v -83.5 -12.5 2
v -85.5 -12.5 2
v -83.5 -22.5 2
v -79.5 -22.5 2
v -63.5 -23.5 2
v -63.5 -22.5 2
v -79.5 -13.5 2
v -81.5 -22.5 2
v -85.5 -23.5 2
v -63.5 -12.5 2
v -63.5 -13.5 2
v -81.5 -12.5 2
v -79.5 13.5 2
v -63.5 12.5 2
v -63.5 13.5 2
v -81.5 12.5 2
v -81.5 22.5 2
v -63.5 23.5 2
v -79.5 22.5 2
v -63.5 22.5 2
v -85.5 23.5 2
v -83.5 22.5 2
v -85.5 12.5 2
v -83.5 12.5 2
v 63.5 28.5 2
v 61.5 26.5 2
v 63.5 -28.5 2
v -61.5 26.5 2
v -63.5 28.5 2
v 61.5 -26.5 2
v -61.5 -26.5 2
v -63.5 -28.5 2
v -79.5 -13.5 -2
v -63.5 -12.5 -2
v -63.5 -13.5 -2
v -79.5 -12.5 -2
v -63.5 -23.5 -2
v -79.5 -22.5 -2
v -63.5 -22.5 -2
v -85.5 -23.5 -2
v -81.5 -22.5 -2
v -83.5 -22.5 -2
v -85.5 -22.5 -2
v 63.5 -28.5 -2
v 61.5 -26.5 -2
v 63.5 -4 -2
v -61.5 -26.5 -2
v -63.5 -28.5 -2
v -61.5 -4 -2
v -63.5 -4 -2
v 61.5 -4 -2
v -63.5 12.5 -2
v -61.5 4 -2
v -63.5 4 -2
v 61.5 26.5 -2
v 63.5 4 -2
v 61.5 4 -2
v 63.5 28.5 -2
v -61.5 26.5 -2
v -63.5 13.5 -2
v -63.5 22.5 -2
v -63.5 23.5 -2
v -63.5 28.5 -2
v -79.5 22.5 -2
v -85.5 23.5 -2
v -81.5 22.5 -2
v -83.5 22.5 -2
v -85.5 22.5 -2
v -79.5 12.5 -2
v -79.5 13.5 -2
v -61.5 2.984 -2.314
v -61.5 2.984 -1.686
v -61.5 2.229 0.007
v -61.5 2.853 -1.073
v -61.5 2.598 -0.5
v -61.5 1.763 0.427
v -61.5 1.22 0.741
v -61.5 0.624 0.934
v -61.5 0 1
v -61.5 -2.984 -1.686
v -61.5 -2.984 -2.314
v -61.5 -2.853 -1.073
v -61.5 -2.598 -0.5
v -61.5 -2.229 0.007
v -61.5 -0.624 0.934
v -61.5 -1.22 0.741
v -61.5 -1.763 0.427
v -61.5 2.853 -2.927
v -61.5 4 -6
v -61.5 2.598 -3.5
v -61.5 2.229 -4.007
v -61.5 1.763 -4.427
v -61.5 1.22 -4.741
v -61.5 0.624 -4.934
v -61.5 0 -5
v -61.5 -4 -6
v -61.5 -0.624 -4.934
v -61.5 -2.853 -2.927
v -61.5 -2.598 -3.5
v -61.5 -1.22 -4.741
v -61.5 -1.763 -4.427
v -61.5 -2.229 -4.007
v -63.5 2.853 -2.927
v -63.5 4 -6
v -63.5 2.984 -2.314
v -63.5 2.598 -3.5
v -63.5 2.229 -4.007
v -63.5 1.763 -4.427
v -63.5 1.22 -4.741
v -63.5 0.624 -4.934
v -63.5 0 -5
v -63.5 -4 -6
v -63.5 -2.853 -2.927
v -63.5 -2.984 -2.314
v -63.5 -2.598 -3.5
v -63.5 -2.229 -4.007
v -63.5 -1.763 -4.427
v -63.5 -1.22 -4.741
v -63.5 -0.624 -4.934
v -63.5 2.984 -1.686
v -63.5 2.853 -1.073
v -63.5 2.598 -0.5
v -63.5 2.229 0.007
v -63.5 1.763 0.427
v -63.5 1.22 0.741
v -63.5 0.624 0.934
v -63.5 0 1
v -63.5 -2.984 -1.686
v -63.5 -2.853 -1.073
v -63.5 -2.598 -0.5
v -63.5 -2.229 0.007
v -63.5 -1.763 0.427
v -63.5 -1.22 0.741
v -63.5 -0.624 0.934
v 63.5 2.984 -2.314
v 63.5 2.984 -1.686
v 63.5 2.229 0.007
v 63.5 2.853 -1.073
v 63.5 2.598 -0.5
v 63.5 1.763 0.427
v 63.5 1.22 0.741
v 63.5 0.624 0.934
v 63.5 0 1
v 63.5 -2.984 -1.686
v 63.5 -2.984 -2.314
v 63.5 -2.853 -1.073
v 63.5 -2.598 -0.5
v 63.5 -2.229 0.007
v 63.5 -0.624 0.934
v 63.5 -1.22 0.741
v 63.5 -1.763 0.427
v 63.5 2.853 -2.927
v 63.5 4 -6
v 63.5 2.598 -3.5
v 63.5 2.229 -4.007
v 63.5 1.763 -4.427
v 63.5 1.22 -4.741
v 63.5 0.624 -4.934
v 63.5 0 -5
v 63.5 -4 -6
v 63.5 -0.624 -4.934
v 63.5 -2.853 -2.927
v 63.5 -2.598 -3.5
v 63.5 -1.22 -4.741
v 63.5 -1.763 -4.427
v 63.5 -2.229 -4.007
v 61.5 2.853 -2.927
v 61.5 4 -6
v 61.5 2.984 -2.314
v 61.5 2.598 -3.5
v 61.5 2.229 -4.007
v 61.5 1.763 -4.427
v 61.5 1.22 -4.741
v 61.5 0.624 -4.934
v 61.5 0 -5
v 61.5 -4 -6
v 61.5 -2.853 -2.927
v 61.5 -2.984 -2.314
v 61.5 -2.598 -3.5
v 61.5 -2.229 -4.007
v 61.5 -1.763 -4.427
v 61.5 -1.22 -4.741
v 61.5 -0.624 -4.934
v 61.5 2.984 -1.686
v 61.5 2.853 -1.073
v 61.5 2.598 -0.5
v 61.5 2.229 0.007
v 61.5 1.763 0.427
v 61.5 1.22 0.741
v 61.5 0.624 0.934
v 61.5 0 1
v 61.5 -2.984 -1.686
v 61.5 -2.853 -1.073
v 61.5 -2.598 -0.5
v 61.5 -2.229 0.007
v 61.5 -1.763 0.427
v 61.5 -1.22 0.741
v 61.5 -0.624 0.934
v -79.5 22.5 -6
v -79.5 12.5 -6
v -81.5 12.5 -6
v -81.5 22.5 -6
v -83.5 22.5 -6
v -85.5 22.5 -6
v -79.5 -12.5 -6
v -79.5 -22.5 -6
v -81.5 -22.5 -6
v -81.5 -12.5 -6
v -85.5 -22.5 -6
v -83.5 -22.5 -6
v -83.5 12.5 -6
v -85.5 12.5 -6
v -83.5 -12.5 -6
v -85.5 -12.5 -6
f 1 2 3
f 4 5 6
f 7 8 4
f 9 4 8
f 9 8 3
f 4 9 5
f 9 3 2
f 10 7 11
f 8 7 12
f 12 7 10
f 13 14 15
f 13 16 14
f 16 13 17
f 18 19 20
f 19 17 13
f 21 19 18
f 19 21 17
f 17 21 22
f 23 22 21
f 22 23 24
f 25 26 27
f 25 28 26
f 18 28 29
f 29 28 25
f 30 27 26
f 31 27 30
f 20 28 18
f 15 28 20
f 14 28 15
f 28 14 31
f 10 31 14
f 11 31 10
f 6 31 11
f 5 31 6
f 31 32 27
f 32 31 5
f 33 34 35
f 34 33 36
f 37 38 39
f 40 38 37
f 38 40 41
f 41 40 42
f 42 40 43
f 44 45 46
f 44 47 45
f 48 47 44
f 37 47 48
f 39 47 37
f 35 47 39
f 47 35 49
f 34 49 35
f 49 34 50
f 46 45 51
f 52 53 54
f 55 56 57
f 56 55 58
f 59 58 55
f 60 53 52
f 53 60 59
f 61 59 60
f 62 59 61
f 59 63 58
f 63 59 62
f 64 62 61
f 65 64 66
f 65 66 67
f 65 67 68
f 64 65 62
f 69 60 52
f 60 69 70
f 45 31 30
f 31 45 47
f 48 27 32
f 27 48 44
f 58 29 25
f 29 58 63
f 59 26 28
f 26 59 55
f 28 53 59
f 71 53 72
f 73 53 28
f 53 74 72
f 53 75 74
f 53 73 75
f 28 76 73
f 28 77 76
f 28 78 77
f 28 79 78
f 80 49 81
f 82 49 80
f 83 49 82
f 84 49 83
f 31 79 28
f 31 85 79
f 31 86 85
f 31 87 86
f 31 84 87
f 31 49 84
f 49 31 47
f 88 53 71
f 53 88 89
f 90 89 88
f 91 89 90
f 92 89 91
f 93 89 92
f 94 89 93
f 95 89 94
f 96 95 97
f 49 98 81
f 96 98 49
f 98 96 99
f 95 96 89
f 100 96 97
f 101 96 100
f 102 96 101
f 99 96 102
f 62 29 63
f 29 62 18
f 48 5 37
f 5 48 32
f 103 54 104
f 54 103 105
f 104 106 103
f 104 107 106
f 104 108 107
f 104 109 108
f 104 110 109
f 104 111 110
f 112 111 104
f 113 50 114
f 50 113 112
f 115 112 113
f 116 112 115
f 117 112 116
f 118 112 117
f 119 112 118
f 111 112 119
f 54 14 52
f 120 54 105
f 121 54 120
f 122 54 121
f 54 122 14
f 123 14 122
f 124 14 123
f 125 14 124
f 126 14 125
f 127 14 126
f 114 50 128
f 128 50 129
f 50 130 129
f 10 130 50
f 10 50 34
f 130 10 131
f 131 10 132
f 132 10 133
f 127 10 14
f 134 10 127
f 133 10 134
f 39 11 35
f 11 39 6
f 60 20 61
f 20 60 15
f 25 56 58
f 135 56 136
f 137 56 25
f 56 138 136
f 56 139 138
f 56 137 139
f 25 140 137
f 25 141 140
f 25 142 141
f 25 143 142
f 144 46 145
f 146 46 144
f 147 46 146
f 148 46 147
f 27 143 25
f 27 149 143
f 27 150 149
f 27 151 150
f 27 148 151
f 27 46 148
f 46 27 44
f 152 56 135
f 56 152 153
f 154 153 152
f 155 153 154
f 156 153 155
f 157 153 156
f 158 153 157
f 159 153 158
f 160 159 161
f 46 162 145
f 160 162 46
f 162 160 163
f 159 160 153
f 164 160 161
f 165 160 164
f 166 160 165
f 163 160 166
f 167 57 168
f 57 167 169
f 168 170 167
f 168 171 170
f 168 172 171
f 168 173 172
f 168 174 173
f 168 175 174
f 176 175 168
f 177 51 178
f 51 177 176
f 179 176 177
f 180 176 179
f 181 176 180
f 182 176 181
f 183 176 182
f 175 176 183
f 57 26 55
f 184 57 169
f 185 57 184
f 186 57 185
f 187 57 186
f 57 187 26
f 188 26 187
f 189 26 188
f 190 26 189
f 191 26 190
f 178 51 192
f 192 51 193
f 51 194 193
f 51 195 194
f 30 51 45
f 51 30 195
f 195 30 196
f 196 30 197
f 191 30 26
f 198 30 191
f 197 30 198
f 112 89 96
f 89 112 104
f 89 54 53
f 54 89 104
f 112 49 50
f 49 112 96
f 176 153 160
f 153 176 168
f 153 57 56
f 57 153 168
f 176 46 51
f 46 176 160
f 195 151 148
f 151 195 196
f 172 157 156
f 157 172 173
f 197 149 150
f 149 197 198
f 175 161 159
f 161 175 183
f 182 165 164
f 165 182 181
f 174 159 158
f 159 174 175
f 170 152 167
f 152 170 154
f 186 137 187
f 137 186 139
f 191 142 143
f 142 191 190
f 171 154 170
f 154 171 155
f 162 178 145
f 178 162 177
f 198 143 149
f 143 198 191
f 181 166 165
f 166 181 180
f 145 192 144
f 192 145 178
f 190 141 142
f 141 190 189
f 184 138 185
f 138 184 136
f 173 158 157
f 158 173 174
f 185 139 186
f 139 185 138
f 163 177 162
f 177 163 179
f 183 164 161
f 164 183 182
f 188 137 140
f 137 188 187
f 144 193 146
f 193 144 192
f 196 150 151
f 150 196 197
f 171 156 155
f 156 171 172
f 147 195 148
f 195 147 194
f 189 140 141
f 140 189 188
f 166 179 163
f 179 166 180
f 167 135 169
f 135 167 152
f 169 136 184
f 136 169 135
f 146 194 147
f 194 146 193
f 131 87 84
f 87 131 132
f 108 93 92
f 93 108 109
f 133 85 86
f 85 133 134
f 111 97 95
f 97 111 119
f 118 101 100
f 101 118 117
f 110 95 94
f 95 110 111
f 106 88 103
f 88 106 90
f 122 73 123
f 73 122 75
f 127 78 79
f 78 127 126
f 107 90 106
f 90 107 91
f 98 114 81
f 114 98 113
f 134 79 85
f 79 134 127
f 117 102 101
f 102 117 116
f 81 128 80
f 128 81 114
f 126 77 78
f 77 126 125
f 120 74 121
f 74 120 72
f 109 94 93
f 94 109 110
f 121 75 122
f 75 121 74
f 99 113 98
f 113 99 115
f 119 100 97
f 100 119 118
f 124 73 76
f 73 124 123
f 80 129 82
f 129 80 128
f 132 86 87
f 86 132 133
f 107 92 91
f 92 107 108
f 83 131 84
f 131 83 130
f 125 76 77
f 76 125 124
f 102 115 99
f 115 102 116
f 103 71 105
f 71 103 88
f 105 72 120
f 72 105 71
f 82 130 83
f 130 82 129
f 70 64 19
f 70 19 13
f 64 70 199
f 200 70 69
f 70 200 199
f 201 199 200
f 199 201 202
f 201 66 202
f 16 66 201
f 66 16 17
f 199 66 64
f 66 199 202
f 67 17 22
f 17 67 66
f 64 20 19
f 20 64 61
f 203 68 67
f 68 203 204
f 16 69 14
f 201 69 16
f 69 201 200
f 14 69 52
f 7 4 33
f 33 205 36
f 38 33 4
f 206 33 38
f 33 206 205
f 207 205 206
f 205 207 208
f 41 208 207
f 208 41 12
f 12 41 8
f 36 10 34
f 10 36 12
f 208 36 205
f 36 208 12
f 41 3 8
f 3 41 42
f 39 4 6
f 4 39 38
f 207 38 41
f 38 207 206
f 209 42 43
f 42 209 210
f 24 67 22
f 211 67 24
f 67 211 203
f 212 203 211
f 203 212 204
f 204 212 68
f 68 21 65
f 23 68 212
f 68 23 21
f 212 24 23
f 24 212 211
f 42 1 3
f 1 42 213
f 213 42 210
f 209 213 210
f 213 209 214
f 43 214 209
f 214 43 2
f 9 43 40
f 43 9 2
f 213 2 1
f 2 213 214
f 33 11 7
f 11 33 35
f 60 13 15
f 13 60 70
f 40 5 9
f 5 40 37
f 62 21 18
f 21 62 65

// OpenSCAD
$fn = 30;

structure_slot_width = 35;
structure_slot_length = 125;

sweep_bearing_width = structure_slot_width + 20;

//SWEEP_BEARING_LEGS
sweep_bearing_leg_length = structure_slot_length + 2;
sweep_bearing_leg_width = 2;
sweep_bearing_leg_height = 4;

for(SIGN = [-1,1]){
translate([0,SIGN * (sweep_bearing_width/2),0])
cube([structure_slot_length,
      sweep_bearing_leg_width,
      sweep_bearing_leg_height],
      center=true);
}

sweep_bearing_cross_bar_depth = 2;
sweep_bearing_cross_bar_height = 4;
sweep_bearing_hole_depth = sweep_bearing_cross_bar_depth;
sweep_bearing_hole_height = 8;
sweep_bearing_hole_width = 8;

//SWEEP_BEARING_CROSS_BARS + SWEEP_BEARING_HOLES
difference(){
    union(){
        //SWEEP_BEARING_CROSS_BARS
        for(SIGN = [-1,1]){
            translate([structure_slot_length/2 * SIGN, 0,0]){
                cube([sweep_bearing_cross_bar_depth, 
                      sweep_bearing_width + sweep_bearing_leg_width,
                      sweep_bearing_cross_bar_height],
                      center = true);
           }
        }
        //BUFFER FOR SWEEP BEARING HOLES
        for(SIGN = [-1,1]){
            translate([structure_slot_length/2 * SIGN,
            0,
            -sweep_bearing_hole_height/4]) // div 4, cause top of bar not middle
            cube([
                sweep_bearing_hole_depth,
                sweep_bearing_hole_width,
                sweep_bearing_hole_height,
            ],
            center=true);
        }
    }
    //END union
    
    //BEGIN holes (subtraction)
    for(SIGN = [1,-1]){
        translate([structure_slot_length/2 * SIGN,
        0,
        -sweep_bearing_hole_height/4]){
            rotate([0,90,0]){
                cylinder(d=6, 6, center=true);
            }
        }
    
    }
}

//SWEEP SERVO HOLSTER
{
    sweep_servo_holster_slot_depth = 2;          // X
    sweep_servo_holster_slot_width = 10;         // Y
    sweep_servo_holster_slot_height  = 8;       // Z
    
    servo_connector_depth = 6;
    
    servo_depth_until_prong = 13;
    servo_height = 12;
    servo_main_body_width = 22;
    servo_prong_depth = 2;
    
    sweep_servo_holster_main_body_width_clearance = 3;
    sweep_servo_holster_prong_clearance = 3;
    
    
    translate([
    //PUT 'ORIGIN' AT CENTER OF FIRST PRONG
    
        -sweep_bearing_leg_length/2 -             // X
        servo_connector_depth       -
        servo_depth_until_prong     +
        sweep_servo_holster_slot_depth,
        
        
        0,                                          // Y
        
        -sweep_servo_holster_slot_height/2 +
        sweep_bearing_cross_bar_height/2,                                          // Z                           
        ]){ 
            
        //sweep_servo_holster_slot
        {
            for(NUM=[0,1]){
                for(SIGN=[1,-1]){
                    translate([
                   
                    -NUM *                                                   // X
                    (sweep_servo_holster_prong_clearance +
                    sweep_servo_holster_slot_depth/2),                                         
                    
                    SIGN *                                                   // Y
                    (sweep_servo_holster_slot_width/2 +
                    servo_main_body_width/2 + 
                    sweep_servo_holster_main_body_width_clearance/2), 
                    
                    0                                                        // Z
                    ]){
                    cube([
                        sweep_servo_holster_slot_depth,   // X
                        sweep_servo_holster_slot_width,   // Y
                        sweep_servo_holster_slot_height   // Z
                         ],
                        center=true);
                    }
                }
            }
        }
        //END sweep_servo_holster_slot
        
        //connect the slot to the body

        for(OUTER=[0,1]){
            bridge_width = 1;
            bridge_depth = 
                servo_connector_depth +
                servo_depth_until_prong +
                (OUTER *
                    (servo_prong_depth +
                    sweep_servo_holster_slot_depth));
        
            for(SIGN = [-1,1]){  
                translate([
                bridge_depth/4 + 4 + .75 + OUTER * -4,  //X with magic number?
                
                SIGN *
                ( OUTER * sweep_servo_holster_slot_width +
                 servo_main_body_width/2 + 
                 sweep_servo_holster_main_body_width_clearance/2 +   //Y
                 bridge_width/2),
                
                sweep_bearing_cross_bar_height/2                       //Z
                ]){
                    cube([
                        bridge_depth,
                        bridge_width,
                        sweep_bearing_cross_bar_height
                    ],
                    center = true);
                }
            }
        }   
    }  
}
